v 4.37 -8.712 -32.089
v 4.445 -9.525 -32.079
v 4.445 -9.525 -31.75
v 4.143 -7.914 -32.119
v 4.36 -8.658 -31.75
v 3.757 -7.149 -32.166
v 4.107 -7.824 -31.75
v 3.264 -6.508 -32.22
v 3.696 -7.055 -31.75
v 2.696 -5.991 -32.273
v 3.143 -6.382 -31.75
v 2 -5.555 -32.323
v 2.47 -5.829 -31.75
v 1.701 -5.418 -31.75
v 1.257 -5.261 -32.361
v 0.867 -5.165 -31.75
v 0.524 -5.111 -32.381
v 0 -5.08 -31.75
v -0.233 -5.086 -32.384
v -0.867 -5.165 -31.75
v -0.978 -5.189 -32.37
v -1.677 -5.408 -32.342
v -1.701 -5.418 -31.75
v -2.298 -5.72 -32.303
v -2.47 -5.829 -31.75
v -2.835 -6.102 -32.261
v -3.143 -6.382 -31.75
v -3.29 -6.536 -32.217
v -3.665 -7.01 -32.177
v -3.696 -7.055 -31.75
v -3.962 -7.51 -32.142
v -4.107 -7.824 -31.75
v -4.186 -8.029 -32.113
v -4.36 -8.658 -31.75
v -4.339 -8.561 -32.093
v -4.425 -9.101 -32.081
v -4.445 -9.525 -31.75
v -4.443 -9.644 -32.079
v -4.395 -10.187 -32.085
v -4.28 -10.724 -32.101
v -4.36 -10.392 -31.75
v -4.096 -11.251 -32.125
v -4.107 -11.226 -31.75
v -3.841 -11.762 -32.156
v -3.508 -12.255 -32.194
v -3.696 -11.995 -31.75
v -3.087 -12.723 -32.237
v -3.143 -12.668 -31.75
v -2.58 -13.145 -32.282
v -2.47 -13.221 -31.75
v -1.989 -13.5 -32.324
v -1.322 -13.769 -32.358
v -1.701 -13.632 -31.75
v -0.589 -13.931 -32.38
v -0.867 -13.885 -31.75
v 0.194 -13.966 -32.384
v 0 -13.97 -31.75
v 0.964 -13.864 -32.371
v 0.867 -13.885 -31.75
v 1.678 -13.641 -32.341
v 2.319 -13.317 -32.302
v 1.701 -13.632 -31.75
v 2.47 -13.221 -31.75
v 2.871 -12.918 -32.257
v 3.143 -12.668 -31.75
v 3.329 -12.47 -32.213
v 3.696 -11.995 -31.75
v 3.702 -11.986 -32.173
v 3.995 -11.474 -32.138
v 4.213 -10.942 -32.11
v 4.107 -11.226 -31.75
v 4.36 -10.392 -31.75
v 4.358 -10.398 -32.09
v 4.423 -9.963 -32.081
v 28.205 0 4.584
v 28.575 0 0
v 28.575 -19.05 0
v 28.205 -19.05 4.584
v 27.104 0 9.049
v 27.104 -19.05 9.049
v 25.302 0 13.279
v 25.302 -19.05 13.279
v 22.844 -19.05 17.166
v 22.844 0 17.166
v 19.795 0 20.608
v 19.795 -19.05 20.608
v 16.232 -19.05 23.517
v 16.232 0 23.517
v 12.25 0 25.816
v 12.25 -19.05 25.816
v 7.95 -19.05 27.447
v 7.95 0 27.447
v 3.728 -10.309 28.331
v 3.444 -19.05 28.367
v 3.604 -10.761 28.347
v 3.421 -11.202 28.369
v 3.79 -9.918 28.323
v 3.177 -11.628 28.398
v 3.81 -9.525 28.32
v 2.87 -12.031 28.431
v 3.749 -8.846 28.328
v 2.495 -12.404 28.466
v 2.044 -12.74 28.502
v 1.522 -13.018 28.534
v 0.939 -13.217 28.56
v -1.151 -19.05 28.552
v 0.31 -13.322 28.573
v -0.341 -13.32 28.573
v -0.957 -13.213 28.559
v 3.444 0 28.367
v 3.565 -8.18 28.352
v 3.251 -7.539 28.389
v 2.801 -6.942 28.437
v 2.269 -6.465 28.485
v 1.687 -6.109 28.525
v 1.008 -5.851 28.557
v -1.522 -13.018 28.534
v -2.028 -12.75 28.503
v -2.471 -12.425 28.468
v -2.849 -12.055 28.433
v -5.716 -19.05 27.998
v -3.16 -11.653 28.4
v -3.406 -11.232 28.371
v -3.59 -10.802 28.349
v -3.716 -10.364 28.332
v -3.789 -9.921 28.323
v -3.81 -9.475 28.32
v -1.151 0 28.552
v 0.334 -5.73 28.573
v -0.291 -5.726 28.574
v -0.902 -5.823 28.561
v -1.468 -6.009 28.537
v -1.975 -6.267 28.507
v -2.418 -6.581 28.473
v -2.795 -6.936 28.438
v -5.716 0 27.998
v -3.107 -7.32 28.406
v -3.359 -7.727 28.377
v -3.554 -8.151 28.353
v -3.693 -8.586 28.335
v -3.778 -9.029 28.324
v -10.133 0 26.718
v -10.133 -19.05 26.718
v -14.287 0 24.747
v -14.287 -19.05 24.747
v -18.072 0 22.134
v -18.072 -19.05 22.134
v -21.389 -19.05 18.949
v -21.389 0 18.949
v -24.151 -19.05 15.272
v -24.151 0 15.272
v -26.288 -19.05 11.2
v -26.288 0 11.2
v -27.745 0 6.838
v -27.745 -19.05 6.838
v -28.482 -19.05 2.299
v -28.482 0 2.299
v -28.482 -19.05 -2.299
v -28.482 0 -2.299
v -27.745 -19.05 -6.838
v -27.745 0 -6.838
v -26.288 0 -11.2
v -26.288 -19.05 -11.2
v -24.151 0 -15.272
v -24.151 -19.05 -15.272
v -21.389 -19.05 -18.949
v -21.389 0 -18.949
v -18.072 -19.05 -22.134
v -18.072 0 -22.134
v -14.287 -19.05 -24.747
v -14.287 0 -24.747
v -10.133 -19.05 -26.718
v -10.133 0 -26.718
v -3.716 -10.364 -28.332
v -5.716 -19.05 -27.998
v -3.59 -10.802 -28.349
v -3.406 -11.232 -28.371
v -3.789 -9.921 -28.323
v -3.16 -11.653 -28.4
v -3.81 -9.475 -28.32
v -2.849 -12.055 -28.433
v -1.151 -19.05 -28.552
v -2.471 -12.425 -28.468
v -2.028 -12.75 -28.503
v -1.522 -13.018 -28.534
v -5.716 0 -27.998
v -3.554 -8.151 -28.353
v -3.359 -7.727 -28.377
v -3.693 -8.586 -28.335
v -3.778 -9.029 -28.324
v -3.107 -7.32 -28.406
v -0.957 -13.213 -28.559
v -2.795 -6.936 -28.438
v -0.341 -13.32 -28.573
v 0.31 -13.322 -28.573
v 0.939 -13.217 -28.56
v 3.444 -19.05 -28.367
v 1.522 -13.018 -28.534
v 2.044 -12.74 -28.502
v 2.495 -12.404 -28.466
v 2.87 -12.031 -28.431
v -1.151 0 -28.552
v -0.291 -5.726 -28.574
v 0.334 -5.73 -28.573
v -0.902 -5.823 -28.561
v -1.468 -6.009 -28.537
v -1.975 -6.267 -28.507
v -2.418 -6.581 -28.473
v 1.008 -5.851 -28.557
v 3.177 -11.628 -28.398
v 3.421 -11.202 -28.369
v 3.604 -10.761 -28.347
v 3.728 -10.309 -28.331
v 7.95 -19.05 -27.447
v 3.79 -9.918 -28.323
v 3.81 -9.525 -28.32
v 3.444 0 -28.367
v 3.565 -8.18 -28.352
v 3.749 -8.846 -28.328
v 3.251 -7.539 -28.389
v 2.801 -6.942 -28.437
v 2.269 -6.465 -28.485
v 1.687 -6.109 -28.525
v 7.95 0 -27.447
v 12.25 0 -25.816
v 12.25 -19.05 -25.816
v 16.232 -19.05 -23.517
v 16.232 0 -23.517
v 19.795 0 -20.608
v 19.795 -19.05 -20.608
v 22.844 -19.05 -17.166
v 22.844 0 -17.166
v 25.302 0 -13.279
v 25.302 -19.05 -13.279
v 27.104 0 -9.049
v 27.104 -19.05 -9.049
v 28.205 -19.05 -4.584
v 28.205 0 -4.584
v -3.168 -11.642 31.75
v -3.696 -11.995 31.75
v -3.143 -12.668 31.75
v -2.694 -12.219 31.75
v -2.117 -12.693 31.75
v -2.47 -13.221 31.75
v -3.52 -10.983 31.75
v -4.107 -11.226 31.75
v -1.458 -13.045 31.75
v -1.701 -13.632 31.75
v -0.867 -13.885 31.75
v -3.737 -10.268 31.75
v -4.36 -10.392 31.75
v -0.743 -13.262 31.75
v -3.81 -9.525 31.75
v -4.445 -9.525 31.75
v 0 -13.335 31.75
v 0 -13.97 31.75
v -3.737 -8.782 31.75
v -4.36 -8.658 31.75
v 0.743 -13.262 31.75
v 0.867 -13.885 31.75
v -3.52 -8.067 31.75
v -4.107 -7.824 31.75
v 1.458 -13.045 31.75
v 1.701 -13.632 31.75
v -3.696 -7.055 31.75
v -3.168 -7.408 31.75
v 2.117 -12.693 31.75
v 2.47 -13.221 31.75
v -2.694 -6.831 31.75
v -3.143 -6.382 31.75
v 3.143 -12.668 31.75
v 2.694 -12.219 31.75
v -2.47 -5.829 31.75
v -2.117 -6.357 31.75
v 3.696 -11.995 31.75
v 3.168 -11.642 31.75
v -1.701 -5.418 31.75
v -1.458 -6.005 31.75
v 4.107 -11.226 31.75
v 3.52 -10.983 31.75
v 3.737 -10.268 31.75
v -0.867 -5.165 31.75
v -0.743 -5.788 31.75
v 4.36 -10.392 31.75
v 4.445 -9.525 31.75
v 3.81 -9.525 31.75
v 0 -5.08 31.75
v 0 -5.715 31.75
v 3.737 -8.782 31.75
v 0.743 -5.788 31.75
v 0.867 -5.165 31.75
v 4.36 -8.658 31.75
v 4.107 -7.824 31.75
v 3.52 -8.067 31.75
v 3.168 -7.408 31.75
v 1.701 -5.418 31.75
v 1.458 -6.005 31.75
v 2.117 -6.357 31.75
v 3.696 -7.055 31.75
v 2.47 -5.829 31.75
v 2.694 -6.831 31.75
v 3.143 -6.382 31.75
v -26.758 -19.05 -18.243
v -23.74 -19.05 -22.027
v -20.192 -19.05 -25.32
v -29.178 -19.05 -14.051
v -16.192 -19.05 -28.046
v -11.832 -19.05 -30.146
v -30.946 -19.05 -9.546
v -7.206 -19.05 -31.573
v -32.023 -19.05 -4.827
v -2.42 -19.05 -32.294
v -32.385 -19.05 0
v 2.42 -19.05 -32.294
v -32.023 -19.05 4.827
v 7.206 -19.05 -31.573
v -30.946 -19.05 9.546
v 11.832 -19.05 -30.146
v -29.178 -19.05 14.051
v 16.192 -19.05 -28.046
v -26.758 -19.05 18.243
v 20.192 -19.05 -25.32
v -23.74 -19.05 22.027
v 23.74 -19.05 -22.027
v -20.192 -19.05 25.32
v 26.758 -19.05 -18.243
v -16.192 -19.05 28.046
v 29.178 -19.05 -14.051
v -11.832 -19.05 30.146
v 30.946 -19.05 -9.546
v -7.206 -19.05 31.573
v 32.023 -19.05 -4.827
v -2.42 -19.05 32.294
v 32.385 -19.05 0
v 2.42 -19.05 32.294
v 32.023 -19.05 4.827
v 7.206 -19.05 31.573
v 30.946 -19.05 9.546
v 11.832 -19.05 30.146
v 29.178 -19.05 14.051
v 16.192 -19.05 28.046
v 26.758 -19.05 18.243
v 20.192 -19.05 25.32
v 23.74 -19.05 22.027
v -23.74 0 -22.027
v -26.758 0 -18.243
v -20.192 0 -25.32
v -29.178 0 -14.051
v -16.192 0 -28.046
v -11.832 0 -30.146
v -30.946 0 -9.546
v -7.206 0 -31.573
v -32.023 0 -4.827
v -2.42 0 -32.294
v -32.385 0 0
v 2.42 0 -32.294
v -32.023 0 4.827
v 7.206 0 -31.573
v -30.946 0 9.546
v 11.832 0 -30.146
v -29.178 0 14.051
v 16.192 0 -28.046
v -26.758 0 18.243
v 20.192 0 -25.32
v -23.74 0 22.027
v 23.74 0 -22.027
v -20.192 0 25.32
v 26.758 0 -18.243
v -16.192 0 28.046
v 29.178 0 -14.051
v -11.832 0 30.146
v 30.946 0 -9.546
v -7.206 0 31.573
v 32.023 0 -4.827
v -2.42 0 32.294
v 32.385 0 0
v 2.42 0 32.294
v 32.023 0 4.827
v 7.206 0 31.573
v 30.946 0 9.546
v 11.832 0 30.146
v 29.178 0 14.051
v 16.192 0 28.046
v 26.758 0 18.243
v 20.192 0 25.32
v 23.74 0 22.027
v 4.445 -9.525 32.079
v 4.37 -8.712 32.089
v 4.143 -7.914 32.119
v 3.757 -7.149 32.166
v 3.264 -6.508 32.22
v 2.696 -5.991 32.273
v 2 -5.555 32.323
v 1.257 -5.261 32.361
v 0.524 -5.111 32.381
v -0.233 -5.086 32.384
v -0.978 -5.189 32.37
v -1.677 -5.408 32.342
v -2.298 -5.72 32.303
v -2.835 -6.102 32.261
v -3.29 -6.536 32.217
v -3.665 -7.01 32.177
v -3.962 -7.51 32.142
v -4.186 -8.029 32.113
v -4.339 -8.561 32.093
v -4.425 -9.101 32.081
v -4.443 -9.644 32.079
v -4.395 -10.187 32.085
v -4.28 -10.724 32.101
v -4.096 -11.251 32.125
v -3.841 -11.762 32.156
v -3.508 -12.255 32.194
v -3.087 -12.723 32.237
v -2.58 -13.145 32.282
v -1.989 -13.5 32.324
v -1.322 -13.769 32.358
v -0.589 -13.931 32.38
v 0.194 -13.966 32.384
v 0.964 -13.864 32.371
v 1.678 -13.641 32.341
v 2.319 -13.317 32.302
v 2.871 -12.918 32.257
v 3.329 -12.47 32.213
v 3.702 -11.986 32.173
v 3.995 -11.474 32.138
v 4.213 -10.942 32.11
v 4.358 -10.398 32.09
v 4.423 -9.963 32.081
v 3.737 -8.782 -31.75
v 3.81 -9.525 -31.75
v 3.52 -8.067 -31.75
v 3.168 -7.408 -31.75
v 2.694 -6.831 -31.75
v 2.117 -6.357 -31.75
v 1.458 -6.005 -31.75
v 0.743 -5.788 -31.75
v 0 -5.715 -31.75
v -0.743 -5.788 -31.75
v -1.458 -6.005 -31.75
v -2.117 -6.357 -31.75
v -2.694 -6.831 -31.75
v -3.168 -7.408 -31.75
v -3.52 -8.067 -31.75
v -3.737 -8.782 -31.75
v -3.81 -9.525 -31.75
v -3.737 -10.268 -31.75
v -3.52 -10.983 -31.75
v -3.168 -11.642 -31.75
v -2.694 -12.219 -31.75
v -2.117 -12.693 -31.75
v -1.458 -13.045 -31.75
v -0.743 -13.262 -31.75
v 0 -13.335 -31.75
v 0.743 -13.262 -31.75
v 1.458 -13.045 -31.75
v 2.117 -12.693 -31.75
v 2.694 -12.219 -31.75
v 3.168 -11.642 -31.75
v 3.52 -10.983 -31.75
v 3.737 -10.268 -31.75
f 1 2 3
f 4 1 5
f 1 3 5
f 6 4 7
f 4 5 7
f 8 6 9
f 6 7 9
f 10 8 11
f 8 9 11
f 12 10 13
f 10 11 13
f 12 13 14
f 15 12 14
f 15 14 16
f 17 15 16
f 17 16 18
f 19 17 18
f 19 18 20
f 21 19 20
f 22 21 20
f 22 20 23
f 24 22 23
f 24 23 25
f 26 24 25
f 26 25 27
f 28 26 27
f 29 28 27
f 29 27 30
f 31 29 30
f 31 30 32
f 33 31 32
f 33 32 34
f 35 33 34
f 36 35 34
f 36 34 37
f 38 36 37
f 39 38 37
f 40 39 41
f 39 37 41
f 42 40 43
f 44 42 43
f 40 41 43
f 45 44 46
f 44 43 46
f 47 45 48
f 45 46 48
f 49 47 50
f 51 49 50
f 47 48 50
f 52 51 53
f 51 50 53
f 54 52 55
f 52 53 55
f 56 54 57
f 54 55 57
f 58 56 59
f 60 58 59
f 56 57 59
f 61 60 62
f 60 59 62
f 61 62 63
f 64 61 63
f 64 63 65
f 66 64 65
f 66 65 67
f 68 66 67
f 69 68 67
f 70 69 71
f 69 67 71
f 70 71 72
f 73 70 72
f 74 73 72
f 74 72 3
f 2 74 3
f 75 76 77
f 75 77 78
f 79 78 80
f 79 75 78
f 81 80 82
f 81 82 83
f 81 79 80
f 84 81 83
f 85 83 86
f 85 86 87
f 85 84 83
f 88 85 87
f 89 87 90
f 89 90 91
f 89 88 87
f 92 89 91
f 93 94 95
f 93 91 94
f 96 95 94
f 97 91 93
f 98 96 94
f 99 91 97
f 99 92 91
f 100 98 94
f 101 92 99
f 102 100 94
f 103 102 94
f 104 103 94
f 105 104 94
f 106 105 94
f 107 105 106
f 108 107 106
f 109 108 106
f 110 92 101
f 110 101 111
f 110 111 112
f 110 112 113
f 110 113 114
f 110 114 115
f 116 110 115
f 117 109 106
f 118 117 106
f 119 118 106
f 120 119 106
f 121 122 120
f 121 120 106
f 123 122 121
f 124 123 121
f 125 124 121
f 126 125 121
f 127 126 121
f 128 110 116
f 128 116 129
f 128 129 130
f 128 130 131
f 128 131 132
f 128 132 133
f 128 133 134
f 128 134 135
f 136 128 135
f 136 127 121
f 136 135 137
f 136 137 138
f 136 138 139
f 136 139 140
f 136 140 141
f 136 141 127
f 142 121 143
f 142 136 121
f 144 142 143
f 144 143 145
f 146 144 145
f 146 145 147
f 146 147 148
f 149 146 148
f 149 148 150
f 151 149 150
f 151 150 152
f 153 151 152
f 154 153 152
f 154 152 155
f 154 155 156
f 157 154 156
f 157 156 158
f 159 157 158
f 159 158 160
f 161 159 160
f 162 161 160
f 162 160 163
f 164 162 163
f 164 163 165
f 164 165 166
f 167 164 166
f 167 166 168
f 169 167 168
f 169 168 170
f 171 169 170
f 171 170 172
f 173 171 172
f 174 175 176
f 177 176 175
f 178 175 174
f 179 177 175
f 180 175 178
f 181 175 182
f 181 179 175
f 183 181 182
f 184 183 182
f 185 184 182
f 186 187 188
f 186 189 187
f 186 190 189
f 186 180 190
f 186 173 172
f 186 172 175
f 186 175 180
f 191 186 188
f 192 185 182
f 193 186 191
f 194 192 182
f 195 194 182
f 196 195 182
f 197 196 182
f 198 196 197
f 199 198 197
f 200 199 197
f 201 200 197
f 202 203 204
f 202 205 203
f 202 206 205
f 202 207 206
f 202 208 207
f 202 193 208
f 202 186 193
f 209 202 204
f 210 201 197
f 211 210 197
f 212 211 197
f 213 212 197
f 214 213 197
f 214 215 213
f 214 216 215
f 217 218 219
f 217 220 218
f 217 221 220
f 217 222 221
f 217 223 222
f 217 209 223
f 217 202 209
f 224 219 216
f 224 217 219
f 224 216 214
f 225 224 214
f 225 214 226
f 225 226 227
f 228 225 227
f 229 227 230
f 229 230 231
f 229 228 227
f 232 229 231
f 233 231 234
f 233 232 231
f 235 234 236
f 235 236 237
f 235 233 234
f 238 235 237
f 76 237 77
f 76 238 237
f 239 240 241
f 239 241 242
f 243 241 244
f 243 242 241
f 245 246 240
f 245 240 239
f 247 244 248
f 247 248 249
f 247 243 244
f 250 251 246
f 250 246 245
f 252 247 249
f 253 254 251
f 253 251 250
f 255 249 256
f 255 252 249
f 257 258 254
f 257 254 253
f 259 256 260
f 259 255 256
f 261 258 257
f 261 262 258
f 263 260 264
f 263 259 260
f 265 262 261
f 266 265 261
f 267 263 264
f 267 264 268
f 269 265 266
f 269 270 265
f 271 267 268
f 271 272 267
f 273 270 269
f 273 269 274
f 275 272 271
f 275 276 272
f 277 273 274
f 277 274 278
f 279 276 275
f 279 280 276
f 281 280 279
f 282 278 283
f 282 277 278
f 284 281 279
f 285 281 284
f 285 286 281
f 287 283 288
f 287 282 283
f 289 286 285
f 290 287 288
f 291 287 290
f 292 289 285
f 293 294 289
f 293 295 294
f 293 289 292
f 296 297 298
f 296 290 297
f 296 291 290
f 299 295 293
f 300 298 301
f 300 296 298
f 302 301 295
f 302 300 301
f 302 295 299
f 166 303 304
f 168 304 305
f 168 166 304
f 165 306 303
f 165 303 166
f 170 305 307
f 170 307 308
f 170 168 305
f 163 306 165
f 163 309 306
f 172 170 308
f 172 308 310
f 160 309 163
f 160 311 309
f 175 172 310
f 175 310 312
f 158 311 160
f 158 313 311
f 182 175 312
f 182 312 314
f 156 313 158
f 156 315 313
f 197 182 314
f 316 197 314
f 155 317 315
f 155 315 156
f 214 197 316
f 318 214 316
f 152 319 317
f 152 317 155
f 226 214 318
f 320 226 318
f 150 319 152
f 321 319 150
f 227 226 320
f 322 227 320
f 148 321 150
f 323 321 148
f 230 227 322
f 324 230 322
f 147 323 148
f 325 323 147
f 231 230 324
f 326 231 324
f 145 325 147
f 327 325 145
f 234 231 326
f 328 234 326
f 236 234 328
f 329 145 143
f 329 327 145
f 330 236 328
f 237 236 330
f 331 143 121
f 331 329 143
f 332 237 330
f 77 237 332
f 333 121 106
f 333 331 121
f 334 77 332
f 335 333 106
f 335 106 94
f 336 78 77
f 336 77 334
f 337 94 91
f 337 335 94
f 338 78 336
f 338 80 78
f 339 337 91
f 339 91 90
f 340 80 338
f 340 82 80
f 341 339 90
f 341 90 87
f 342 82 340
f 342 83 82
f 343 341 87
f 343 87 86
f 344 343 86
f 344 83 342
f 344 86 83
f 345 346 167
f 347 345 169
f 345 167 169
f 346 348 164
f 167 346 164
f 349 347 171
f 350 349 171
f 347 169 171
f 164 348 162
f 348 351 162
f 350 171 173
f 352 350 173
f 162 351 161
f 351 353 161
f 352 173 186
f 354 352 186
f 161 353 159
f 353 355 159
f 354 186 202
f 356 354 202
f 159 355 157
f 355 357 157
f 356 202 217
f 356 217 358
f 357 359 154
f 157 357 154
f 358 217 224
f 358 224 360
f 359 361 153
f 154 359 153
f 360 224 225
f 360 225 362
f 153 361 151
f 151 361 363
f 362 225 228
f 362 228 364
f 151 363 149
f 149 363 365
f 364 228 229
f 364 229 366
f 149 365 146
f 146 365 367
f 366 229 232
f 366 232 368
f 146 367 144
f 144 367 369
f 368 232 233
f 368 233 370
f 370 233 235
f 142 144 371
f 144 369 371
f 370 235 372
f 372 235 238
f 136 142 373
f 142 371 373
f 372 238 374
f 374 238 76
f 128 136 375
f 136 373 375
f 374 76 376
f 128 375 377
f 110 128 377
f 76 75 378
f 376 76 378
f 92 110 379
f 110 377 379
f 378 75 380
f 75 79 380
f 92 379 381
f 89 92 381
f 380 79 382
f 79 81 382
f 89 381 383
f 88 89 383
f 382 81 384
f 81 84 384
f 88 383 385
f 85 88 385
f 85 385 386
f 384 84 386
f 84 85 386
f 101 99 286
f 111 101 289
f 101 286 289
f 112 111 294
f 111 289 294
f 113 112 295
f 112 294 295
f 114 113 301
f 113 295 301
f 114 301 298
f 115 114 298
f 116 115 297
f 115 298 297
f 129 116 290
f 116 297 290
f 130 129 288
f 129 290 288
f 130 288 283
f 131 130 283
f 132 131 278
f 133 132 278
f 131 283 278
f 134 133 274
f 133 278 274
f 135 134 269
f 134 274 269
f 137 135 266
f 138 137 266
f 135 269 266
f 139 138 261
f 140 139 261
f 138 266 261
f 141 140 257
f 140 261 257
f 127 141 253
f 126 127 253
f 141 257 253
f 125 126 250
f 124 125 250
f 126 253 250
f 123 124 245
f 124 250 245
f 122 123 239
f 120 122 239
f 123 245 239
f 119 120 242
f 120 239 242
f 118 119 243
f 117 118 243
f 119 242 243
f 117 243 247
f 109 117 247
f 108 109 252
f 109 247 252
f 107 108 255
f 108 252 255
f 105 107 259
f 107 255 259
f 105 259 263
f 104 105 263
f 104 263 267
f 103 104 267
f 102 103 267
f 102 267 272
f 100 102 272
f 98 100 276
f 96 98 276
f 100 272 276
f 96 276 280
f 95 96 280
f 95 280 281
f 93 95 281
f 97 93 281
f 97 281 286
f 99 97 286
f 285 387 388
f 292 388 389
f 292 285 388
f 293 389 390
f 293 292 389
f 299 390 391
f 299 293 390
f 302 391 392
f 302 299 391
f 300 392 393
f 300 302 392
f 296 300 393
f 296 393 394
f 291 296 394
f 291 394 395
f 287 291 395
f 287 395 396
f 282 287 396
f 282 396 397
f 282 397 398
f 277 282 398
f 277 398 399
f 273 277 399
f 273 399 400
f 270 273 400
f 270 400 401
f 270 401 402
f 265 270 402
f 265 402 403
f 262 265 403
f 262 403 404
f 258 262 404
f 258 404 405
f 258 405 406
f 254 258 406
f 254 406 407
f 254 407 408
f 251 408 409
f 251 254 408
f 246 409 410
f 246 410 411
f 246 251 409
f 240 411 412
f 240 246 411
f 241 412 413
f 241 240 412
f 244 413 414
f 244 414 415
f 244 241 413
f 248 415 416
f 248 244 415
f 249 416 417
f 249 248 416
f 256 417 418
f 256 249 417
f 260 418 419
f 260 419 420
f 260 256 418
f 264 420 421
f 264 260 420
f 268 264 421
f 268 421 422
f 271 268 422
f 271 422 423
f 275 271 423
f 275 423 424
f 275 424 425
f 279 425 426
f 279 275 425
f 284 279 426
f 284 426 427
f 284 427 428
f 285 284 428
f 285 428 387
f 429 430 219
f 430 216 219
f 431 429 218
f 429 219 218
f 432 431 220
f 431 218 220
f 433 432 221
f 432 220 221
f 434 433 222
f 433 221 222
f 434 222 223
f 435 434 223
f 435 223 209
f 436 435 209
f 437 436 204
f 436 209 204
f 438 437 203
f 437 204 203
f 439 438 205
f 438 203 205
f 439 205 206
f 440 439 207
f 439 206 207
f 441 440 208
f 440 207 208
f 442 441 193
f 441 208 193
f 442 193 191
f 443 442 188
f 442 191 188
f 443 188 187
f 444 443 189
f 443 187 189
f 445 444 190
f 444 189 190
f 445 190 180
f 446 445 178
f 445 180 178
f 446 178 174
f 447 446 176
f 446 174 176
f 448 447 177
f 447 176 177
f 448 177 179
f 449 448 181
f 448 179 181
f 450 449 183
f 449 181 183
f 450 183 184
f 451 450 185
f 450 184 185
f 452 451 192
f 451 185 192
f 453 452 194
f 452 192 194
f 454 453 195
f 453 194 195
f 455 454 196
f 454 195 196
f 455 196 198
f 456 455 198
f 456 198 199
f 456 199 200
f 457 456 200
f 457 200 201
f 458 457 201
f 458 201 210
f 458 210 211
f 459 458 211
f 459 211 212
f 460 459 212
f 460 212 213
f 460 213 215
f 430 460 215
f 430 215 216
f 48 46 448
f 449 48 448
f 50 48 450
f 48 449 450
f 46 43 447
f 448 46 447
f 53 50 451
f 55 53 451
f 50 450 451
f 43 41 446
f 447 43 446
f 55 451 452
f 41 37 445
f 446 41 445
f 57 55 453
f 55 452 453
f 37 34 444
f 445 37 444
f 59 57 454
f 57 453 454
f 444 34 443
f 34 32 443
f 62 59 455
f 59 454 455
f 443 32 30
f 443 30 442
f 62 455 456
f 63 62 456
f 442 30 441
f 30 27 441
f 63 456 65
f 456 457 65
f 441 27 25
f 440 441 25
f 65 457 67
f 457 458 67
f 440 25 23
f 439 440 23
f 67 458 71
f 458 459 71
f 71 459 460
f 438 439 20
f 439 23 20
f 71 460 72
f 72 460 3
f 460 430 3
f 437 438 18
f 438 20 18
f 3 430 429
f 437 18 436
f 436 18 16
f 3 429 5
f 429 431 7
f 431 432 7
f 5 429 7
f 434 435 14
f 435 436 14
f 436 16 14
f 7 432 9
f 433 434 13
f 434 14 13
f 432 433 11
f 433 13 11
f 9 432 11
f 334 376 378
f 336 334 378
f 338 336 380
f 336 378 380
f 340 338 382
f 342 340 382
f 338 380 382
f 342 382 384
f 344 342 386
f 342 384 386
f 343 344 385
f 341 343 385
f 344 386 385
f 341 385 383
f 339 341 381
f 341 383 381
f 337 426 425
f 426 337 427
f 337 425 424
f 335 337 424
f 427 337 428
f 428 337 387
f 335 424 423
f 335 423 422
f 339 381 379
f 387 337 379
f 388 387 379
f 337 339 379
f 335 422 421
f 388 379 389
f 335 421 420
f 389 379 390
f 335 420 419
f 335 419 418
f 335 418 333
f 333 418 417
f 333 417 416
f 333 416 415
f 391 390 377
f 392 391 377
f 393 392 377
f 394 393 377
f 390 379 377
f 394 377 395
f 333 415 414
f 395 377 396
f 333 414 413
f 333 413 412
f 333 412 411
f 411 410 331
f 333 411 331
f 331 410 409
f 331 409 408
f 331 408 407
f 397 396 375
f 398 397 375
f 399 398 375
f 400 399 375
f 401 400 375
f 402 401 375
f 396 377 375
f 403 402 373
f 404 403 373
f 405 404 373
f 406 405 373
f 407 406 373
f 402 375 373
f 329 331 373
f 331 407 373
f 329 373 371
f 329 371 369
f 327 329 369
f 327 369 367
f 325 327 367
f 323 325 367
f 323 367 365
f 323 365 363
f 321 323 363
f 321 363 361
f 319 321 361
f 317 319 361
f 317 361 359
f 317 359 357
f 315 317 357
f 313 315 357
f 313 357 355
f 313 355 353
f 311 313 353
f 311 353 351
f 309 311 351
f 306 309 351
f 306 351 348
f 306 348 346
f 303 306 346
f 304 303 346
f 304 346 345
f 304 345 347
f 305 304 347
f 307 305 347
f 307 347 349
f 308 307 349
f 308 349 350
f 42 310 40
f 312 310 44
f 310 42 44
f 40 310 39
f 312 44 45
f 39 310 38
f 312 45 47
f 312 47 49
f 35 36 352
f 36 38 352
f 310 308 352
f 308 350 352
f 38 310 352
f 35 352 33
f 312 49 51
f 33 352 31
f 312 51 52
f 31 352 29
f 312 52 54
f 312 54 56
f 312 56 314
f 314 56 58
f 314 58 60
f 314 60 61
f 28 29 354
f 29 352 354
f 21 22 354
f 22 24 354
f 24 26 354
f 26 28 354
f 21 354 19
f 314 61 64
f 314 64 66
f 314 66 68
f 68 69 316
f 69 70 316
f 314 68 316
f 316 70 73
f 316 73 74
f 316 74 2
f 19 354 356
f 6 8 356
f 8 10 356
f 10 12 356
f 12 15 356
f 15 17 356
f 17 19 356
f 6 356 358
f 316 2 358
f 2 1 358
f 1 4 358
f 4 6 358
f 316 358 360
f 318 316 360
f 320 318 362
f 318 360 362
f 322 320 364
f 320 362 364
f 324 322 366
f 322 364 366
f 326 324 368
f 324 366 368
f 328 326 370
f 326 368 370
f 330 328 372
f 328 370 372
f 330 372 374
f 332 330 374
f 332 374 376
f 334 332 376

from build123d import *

# Parameters (mm, degrees)
F0_R     = 32.385
F0_R_2   = 28.575
F1_DEPTH = 19.05
F2_R     = 3.81
F3_DEPTH = 38.1
F6_R     = 4.445
F6_R_2   = 3.81
F7_DEPTH = 25.4
F8_R     = 4.445
F8_R_2   = 3.81
F9_DEPTH = 25.4


with BuildPart() as f1:
    # F0 (on Front) → F1 (new body)
    with BuildSketch(Plane.XZ):
        Circle(F0_R)
        Circle(F0_R_2, mode=Mode.SUBTRACT)
    extrude(amount=F1_DEPTH)

    # F2 (on Top) → F3 (cut, symmetric)
    with BuildSketch(Plane.XY):
        with Locations((0, -9.525)):
            Circle(F2_R)
    extrude(amount=F3_DEPTH, both=True, mode=Mode.SUBTRACT)

    # F6 (on offset) → F7 (cut)
    with BuildSketch(Plane.XY.offset(31.75)):
        with Locations((0, -9.525)):
            Circle(F6_R)
        with Locations((0, -9.525)):
            Circle(F6_R_2, mode=Mode.SUBTRACT)
    extrude(amount=F7_DEPTH, mode=Mode.SUBTRACT)

    # F8 (on offset) → F9 (cut)
    with BuildSketch(Plane.XY.offset(-31.75)):
        with Locations((0, -9.525)):
            Circle(F8_R)
        with Locations((0, -9.525)):
            Circle(F8_R_2, mode=Mode.SUBTRACT)
    extrude(amount=-F9_DEPTH, mode=Mode.SUBTRACT)


solid = f1.part
